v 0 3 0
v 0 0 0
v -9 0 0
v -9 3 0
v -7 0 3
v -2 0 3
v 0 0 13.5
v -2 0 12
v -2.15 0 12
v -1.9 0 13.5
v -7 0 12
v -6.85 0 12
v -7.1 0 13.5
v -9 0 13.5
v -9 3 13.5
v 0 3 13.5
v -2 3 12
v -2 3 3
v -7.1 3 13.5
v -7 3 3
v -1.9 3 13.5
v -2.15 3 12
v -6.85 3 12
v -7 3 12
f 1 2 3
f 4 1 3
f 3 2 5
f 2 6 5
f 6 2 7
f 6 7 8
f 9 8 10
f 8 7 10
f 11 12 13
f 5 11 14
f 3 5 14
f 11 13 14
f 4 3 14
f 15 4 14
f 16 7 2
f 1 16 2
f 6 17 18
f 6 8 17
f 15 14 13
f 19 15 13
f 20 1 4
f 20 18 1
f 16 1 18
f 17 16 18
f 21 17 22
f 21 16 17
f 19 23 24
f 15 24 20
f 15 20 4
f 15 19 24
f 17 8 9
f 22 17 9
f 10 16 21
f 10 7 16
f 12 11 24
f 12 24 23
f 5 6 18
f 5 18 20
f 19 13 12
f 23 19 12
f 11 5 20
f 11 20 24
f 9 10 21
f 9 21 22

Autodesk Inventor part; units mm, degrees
ref_plane "YZ Plane" through (0, 0, 0) normal (1, 0, 0) x (0, 1, 0)
ref_plane "XZ Plane" through (0, 0, 0) normal (0, 1, 0) x (-1, 0, 0)
ref_plane "XY Plane" through (0, 0, 0) normal (0, 0, 1) x (1, 0, 0)
sketch "草圖1" plane through (0, 0, 0) normal (0, 1, 0) x (-1, 0, 0)
  line L0 (0, 0) -> (9, 0)
  line L1 (9, 0) -> (9, 13.5)
  line L2 (0, 13.5) -> (0, 0)
  line L3 (2, 12) -> (2, 3)
  line L4 (2, 3) -> (7, 3)
  line L5 (7, 3) -> (7, 12)
  line L6 (9, 13.5) -> (7.1, 13.5)
  line L7 (7, 12) -> (6.85, 12)
  line L8 (7.1, 13.5) -> (6.85, 12)
  line L9 (4.5, 3) -> (4.5, 0)
  line L10 (0, 13.5) -> (1.9, 13.5)
  line L11 (2, 12) -> (2.15, 12)
  line L12 (1.9, 13.5) -> (2.15, 12)
  dimension "d0" = 13.5
  dimension "d1" = 9
  dimension "d2" = 5
  dimension "d3" = 9
  dimension "d4" = 1.5
  dimension "d5" = 2
  dimension "d6" = 1.9
  dimension "d7" = 0.15
  dimension "d8" = 2
  dimension "d9" = 5
extrude "擠出1" add sketch "草圖1" along normal blind 3
properties part number "夾持器"
